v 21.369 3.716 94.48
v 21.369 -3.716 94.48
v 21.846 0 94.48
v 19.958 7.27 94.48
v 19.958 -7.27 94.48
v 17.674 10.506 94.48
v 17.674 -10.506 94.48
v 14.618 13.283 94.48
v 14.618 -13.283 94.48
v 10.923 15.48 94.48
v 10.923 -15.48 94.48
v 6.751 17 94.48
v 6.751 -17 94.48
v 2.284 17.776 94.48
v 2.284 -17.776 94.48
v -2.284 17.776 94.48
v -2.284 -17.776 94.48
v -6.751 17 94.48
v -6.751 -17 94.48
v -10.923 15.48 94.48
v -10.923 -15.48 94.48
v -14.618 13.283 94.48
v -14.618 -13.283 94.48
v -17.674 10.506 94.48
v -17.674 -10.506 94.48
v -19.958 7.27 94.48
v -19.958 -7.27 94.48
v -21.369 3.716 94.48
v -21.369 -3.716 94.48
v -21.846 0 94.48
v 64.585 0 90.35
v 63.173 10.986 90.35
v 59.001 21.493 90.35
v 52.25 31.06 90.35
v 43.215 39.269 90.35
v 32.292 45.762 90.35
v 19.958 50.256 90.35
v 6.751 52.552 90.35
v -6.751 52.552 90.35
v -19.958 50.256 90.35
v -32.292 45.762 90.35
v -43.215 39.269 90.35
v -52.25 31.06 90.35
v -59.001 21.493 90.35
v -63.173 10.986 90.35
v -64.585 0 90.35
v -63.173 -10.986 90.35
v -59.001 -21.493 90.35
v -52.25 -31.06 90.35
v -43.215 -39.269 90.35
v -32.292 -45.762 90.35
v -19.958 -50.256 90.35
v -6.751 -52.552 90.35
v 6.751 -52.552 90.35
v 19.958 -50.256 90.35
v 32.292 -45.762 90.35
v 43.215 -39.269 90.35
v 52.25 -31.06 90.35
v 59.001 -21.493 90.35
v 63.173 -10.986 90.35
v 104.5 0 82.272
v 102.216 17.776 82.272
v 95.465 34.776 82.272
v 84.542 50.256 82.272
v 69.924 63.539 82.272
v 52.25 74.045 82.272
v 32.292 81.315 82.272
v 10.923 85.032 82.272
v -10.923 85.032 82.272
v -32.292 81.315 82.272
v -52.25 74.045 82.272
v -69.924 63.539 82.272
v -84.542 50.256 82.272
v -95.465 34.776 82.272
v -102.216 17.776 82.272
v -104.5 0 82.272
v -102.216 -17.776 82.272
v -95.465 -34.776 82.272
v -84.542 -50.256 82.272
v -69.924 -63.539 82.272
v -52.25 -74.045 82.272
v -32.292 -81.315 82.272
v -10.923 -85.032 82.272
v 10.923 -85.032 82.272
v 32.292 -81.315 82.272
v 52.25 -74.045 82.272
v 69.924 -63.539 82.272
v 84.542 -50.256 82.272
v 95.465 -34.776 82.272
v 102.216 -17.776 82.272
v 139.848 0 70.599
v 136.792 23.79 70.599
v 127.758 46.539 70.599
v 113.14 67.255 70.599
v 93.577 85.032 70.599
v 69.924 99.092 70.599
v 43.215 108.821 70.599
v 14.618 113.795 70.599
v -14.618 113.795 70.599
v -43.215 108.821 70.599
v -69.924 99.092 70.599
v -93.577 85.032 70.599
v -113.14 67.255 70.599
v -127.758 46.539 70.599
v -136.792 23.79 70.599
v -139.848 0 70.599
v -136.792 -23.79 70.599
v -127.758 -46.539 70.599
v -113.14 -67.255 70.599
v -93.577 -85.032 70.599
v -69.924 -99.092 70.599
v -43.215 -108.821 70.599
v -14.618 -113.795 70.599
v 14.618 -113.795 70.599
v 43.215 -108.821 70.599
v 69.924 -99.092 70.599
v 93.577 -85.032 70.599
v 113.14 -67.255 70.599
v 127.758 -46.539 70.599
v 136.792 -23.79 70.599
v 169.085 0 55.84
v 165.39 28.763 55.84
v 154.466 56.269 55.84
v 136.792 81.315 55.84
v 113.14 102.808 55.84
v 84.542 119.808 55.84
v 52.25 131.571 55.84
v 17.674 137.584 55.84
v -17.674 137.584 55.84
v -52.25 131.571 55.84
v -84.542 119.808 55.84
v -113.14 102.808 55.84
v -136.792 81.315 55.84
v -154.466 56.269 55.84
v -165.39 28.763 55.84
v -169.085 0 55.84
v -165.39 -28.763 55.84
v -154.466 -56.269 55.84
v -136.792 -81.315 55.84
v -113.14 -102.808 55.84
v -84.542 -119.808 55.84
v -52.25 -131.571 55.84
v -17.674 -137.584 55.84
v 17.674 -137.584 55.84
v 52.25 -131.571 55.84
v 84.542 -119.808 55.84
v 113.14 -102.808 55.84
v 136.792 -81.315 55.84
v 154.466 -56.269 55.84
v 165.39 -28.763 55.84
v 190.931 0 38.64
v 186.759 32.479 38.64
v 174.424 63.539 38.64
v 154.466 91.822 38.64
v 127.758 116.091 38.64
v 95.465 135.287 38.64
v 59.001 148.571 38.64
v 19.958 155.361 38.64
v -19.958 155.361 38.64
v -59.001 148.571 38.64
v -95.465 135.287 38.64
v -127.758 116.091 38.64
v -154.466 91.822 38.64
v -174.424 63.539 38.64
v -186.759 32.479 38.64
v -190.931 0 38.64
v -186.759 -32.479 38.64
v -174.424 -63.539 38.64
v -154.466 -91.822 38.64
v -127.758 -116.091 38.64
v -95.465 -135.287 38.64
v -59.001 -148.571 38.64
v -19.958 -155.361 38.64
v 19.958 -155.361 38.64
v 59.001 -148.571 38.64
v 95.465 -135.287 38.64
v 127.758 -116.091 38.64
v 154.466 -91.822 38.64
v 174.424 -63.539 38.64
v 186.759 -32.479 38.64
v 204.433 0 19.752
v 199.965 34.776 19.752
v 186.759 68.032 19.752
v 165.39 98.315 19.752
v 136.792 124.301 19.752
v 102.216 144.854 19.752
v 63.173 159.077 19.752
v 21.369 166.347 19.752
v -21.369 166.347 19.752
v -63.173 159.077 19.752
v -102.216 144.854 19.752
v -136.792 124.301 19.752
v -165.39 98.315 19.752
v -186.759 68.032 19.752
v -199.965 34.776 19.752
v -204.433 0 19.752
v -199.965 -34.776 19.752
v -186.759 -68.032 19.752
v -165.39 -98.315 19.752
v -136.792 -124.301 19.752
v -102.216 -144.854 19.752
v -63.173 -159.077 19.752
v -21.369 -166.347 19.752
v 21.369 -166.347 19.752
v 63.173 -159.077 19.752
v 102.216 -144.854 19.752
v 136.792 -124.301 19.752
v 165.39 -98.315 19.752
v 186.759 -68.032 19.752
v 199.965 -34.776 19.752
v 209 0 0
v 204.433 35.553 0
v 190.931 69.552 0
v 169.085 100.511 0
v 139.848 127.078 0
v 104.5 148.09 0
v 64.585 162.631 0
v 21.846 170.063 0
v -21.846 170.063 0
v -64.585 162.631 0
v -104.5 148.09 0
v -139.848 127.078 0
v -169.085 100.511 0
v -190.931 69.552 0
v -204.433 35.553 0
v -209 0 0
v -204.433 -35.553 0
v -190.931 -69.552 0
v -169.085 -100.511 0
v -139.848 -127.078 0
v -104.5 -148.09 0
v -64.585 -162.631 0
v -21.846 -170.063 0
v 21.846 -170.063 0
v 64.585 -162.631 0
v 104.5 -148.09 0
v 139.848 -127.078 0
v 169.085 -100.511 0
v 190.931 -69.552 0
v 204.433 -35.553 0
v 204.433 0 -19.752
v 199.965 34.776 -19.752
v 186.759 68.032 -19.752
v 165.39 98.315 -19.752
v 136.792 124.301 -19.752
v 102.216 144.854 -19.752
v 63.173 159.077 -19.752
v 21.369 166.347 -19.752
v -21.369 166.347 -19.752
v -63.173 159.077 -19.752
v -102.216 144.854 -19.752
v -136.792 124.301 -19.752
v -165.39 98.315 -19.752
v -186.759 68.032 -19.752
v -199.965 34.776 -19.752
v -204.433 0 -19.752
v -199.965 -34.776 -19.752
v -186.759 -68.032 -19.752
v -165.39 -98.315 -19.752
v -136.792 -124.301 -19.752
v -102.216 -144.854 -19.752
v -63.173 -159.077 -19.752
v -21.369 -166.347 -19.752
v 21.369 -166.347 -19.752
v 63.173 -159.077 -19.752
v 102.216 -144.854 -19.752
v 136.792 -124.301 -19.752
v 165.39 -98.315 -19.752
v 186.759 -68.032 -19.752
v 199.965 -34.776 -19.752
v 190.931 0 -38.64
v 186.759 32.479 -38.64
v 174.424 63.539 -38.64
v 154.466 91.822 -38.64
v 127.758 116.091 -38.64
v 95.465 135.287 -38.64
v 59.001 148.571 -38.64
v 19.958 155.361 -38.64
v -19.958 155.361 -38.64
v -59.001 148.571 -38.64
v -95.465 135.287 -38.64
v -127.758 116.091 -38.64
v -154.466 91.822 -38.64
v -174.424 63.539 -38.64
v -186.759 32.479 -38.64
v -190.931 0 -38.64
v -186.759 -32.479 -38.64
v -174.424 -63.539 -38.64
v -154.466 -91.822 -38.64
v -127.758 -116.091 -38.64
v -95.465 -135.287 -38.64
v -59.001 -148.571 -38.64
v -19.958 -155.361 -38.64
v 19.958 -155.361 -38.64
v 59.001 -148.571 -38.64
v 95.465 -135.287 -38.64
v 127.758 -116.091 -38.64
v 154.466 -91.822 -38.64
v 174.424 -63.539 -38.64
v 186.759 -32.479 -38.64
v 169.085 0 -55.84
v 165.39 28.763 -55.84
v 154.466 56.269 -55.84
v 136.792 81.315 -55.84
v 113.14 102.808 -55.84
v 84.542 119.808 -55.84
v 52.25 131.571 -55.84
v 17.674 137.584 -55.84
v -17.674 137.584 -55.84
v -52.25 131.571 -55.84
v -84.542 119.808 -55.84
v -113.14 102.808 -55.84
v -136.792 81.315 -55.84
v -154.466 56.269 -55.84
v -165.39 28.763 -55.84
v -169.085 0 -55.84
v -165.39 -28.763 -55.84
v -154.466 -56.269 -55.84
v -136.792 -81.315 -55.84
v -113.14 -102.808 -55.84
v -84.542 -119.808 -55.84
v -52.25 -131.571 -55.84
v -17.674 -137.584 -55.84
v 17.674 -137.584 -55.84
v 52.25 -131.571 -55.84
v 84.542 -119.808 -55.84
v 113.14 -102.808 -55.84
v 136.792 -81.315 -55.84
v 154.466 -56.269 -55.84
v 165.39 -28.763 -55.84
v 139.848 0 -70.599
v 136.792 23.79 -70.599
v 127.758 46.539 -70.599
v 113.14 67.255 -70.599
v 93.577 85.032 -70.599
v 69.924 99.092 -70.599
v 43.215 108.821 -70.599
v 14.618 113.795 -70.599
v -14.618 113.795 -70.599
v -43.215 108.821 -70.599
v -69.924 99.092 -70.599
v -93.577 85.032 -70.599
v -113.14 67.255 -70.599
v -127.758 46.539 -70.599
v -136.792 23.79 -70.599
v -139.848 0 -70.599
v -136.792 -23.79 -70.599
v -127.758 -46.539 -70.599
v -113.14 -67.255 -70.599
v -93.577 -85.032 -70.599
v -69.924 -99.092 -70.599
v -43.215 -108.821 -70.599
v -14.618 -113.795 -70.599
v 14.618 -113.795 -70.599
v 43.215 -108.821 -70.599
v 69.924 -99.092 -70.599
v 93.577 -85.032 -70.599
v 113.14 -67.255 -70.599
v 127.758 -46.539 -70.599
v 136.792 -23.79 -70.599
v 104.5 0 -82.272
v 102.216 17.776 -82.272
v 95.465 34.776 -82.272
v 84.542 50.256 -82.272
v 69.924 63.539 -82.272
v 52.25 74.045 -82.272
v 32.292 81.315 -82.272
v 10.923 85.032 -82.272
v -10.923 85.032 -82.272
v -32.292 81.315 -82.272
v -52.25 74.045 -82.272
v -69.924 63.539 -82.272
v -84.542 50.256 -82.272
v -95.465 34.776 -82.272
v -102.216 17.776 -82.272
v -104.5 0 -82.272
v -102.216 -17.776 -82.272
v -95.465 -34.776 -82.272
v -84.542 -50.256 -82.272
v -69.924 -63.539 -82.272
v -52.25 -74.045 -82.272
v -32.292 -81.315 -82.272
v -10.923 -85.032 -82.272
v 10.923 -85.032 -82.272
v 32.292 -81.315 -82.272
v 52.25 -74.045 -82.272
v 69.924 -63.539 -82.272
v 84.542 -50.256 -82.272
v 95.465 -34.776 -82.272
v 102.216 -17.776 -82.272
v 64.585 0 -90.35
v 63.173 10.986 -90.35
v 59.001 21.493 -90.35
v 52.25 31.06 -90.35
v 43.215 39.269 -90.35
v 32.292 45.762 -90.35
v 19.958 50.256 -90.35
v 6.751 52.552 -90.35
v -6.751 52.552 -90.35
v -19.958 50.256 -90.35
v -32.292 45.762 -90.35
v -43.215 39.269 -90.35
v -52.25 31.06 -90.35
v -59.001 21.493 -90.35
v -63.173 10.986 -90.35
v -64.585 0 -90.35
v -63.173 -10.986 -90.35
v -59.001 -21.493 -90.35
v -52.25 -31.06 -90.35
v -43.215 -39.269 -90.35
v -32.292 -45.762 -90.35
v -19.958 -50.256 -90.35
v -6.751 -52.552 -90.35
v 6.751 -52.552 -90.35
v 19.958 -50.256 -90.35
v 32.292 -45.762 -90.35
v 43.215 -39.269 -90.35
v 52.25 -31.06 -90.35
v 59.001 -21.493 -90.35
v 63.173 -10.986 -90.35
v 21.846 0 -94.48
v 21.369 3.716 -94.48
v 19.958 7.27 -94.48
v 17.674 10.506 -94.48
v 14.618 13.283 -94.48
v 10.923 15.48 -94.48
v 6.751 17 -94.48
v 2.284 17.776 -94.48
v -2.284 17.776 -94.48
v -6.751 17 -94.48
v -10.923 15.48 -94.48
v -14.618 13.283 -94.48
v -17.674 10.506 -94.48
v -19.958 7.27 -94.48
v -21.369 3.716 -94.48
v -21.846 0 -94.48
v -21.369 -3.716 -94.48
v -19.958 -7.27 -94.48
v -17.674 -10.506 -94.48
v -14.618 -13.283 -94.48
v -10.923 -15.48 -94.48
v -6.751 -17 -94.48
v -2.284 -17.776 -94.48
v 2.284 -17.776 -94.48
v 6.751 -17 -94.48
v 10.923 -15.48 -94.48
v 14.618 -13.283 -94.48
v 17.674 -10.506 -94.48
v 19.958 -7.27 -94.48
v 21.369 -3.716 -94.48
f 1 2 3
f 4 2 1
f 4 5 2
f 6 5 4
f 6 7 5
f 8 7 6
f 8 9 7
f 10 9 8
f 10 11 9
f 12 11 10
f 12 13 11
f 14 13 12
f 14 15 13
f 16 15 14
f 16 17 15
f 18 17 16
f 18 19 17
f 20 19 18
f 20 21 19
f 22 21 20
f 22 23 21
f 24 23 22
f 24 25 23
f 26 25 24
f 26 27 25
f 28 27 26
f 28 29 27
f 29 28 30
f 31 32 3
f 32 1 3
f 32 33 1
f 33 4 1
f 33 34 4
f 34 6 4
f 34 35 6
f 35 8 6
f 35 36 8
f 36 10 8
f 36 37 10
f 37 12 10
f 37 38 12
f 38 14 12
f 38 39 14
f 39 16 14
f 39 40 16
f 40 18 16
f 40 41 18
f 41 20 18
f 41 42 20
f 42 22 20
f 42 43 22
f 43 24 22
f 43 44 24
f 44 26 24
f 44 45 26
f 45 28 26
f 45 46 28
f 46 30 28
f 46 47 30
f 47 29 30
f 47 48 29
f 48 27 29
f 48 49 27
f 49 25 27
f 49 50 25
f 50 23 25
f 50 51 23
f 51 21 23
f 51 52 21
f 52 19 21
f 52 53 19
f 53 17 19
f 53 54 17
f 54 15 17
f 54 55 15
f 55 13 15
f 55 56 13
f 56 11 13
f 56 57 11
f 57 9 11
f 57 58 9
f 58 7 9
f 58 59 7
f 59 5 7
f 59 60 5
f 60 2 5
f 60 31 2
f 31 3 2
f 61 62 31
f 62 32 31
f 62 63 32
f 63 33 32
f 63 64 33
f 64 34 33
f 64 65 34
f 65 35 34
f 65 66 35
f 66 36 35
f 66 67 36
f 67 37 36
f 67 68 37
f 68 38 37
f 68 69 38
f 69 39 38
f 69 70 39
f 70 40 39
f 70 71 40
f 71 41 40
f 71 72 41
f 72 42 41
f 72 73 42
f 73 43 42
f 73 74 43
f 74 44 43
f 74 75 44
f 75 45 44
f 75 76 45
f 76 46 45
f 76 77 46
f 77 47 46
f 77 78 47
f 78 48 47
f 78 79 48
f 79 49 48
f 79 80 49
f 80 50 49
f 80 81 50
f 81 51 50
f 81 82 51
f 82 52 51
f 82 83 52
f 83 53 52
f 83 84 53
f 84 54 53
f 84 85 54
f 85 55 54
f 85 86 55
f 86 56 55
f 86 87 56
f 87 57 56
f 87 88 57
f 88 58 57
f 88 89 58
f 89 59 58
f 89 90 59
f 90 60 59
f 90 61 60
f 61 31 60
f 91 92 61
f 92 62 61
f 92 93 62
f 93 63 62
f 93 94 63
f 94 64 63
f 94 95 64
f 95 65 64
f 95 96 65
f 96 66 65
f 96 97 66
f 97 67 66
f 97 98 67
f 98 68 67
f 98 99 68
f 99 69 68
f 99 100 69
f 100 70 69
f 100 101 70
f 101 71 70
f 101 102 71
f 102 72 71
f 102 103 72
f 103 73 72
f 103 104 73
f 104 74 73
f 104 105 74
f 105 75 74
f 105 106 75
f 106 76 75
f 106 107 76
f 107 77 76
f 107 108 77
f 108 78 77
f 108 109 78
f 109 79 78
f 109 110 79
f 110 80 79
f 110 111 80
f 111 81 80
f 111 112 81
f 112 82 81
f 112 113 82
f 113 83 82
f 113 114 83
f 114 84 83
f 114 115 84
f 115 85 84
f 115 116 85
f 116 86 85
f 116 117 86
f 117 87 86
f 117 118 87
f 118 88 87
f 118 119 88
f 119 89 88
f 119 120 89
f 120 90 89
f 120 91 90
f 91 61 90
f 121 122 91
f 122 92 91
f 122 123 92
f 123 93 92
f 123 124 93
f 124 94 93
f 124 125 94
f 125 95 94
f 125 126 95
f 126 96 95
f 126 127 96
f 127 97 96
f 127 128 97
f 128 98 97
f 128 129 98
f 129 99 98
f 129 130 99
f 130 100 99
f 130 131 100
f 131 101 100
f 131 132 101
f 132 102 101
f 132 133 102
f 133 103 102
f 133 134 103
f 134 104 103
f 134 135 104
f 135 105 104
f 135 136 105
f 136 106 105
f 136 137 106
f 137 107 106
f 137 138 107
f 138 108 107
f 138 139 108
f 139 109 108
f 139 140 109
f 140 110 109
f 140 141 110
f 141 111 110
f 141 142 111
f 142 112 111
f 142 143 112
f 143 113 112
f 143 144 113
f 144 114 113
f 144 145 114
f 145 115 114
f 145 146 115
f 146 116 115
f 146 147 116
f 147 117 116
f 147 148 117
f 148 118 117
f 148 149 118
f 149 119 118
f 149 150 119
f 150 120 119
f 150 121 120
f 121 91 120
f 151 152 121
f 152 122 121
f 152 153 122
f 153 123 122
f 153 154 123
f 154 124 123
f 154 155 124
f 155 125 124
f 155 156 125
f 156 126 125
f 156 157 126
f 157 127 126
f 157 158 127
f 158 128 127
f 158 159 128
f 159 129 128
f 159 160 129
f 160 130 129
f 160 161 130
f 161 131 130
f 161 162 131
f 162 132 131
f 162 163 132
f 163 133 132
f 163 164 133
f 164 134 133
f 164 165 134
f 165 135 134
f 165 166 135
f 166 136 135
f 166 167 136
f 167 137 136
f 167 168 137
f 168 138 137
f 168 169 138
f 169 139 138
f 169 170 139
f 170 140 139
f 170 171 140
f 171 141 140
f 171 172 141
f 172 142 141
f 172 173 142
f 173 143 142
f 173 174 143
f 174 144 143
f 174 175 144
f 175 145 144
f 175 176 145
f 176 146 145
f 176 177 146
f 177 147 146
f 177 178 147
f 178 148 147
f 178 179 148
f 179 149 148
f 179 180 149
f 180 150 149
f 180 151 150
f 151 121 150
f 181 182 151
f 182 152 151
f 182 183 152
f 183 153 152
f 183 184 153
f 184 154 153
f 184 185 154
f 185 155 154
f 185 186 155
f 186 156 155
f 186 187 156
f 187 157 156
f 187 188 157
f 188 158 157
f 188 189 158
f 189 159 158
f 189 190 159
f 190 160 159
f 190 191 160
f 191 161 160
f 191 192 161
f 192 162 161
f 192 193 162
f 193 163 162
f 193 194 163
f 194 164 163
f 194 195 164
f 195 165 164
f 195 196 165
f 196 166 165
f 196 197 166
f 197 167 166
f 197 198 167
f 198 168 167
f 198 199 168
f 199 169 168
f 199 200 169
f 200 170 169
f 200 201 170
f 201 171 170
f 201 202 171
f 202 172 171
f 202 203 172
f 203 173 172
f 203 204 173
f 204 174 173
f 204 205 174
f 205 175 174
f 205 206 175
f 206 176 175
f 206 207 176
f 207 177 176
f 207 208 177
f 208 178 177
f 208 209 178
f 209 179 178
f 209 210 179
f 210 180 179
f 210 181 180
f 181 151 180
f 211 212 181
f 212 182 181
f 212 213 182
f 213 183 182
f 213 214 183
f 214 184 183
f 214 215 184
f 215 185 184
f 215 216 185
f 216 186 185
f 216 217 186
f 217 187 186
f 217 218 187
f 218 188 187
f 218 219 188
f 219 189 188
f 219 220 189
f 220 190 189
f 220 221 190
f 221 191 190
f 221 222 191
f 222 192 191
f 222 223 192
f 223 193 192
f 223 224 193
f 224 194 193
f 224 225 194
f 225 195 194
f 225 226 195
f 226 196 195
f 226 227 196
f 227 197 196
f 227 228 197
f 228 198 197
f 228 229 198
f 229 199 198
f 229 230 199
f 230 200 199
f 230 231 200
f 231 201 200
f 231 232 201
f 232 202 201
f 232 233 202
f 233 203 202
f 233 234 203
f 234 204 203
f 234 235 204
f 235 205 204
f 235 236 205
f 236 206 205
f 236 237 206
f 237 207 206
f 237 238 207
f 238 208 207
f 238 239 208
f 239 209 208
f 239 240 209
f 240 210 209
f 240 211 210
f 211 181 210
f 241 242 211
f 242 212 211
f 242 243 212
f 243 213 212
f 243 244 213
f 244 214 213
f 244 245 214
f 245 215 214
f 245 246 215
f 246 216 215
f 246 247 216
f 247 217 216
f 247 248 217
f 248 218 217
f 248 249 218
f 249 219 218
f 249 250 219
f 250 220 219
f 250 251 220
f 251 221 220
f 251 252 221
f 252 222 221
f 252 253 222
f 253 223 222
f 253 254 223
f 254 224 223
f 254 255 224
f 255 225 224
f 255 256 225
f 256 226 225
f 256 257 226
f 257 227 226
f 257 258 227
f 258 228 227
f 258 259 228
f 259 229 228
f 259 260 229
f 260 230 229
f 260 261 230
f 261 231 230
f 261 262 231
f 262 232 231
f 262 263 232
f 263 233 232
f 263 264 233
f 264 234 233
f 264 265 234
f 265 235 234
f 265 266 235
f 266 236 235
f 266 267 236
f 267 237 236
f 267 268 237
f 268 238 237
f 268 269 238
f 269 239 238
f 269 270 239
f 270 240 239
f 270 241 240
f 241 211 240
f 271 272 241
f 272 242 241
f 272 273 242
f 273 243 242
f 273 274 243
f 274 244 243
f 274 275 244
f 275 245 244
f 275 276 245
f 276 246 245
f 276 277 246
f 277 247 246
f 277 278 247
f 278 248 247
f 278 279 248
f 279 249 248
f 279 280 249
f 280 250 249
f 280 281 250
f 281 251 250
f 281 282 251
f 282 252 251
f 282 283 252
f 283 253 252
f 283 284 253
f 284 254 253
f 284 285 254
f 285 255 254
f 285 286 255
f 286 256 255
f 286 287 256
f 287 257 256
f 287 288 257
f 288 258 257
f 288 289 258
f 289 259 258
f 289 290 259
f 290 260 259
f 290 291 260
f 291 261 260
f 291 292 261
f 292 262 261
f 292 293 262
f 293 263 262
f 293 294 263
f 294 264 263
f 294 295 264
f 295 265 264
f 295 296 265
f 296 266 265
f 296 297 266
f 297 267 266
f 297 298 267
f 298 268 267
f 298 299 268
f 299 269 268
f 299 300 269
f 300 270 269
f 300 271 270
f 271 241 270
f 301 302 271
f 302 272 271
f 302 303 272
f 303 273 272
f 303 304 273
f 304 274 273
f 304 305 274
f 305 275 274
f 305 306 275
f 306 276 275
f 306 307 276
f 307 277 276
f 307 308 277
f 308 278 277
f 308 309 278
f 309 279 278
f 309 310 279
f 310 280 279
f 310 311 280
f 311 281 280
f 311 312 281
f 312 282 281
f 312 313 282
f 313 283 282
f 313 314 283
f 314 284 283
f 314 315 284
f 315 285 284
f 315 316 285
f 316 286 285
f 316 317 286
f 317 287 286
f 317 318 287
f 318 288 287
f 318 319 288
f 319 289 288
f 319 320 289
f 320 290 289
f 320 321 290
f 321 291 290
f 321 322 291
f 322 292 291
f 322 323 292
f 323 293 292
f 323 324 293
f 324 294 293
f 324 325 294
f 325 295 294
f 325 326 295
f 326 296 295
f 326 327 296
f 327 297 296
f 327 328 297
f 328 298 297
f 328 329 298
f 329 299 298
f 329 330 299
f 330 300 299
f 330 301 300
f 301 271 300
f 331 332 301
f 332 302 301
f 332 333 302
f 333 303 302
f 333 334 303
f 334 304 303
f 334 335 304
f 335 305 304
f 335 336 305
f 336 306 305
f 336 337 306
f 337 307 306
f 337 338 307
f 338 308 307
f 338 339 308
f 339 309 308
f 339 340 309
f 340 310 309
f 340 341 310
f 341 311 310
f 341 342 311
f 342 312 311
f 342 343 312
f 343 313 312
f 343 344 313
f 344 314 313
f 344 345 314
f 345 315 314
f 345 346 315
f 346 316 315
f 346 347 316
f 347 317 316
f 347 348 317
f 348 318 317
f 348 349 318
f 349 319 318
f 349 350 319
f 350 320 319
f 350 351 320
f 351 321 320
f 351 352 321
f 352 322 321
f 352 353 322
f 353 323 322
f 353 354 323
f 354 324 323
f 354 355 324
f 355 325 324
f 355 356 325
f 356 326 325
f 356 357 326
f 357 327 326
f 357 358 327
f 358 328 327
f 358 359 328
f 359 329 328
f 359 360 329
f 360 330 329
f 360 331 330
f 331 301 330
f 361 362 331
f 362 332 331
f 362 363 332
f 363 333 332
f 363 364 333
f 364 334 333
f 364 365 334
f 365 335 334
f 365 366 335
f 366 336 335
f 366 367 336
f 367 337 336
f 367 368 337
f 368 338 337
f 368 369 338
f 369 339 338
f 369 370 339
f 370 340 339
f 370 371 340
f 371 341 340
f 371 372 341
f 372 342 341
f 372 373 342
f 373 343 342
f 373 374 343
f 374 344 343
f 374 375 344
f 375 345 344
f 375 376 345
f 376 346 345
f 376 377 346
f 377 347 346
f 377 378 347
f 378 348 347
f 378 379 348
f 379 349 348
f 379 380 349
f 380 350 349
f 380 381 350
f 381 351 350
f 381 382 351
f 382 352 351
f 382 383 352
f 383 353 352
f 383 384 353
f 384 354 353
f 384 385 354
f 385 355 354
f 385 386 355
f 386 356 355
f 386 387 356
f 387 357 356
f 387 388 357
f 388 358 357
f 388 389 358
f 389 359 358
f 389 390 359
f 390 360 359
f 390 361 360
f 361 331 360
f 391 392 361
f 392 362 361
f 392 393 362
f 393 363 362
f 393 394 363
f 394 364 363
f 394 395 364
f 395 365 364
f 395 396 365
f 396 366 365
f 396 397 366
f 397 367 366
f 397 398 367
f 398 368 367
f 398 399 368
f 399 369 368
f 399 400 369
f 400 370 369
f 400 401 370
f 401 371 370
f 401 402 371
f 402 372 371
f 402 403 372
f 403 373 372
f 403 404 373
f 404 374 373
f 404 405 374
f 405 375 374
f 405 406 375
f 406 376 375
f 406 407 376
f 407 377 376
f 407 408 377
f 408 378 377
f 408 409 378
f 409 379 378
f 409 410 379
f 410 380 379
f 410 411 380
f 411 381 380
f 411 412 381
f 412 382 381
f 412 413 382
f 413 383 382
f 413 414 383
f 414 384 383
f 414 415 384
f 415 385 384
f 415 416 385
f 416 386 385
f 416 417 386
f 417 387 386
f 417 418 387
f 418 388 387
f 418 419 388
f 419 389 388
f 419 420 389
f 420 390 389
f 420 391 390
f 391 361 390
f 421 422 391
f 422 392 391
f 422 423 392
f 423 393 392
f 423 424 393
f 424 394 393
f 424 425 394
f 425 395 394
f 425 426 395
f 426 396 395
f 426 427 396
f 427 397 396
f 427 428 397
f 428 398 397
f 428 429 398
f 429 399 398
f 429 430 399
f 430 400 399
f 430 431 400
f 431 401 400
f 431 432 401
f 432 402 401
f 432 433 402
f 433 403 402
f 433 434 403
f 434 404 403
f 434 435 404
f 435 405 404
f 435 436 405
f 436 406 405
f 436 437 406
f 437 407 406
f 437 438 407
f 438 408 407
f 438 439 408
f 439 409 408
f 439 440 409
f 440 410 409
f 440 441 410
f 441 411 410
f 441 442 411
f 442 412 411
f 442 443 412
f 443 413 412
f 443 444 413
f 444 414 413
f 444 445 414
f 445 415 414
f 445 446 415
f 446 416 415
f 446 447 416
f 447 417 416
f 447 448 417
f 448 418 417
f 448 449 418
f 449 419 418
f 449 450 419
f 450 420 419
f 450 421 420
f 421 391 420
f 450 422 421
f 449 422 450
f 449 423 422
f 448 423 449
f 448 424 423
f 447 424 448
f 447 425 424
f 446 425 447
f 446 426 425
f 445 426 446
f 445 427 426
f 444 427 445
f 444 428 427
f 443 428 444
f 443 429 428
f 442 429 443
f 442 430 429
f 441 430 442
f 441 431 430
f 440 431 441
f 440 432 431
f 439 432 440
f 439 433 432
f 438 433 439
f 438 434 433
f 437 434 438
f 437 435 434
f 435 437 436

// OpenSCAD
// Generated by SolidPython 1.0.1 on 2020-07-29 00:46:49


scale(v = [11, 9, 5]) {
	sphere(r = 19);
}
/***********************************************
*********      SolidPython code:      **********
************************************************
 
# import packages: SolidPython
from solid import *
from solid.utils import *
from itertools import chain, combinations, permutations


class Resize:

    def __init__(self, scad_file):
        self.scad_file = scad_file
        #self.scad_file = import_scad(scad_file)
        # cone/cylinder param:
        self.r1 = 0
        self.r2 = 0
        self.h = 0
        # rectangular prism param:
        self.w = 0
        self.l = 0
        # ellipse param:
        self.r = 0

    # import OpenScad code (file name corresponds to shape)


    # classify shape + parameters
    def assign(self, param1, param2, param3):
        if self.scad_file == 'cone.scad':
            self.r1 = param1
            self.r2 = param2
            self.h = param3
        elif self.scad_file == 'cylinder.scad':
            self.r1 = param1
            self.r2 = param2
            self.h = param3
        elif self.scad_file == 'rectangularPrism.scad':
            self.h = param1
            self.l = param2
            self.w = param3
        else:
            self.r = param1
            self.h = param2

    # resize parameters
    def iterate(self):
        x = range(3, 20, 2)
        i = 1
        if self.scad_file == 'cone.scad':
            tempList = list(permutations(x, 2))
            for temp in tempList:
                param1 = temp[0]
                param2 = temp[1]
                filepath = 'produced_scad_files/' + 'cone' + str(param1) + '_' + str(param2) + '_' + '.scad'
                scad_render_to_file(cylinder(h=param1, r1=param2, r2=0), filepath)

        elif self.scad_file == 'cylinder.scad':
            tempList = list(permutations(x, 3))
            for temp in tempList:
                param1 = temp[0]
                param2 = temp[1]
                filepath = 'produced_scad_files/' + 'cylinder' + str(param1) + '_' + str(param2) + '_' + '.scad'
                scad_render_to_file(cylinder(h=param1, r1=param2, r2=param2), filepath)

        elif self.scad_file == 'rectangularPrism.scad':
            tempList = list(permutations(x, 3))
            for temp in tempList:
                param1 = temp[0]
                param2 = temp[1]
                param3 = temp[2]
                filepath = 'produced_scad_files/' + 'rectangularPrism' + str(param1) + '_' + str(param2) + '_' + str(
                    param3) + '.scad'
                scad_render_to_file(cube(size=(param1, param2, param3)), filepath)

        elif self.scad_file == 'ellipse.scad':
            tempList = list(permutations(x, 4))
            for temp in tempList:
                param1 = temp[0]
                param2 = temp[1]
                param3 = temp[2]
                param4 = temp[3]
                filepath = 'produced_scad_files/' + 'ellipse' + str(param1) + '_' + str(param2) + '_' + str(param3) + '_' + str(param4) + '.scad'
                scad_render_to_file(scale([param1, param2, param3])(sphere(r=param4)), filepath)

    def render_to_scadfile(self):
        scad_render_to_file(scad, 'example.scad') 
 
************************************************/
